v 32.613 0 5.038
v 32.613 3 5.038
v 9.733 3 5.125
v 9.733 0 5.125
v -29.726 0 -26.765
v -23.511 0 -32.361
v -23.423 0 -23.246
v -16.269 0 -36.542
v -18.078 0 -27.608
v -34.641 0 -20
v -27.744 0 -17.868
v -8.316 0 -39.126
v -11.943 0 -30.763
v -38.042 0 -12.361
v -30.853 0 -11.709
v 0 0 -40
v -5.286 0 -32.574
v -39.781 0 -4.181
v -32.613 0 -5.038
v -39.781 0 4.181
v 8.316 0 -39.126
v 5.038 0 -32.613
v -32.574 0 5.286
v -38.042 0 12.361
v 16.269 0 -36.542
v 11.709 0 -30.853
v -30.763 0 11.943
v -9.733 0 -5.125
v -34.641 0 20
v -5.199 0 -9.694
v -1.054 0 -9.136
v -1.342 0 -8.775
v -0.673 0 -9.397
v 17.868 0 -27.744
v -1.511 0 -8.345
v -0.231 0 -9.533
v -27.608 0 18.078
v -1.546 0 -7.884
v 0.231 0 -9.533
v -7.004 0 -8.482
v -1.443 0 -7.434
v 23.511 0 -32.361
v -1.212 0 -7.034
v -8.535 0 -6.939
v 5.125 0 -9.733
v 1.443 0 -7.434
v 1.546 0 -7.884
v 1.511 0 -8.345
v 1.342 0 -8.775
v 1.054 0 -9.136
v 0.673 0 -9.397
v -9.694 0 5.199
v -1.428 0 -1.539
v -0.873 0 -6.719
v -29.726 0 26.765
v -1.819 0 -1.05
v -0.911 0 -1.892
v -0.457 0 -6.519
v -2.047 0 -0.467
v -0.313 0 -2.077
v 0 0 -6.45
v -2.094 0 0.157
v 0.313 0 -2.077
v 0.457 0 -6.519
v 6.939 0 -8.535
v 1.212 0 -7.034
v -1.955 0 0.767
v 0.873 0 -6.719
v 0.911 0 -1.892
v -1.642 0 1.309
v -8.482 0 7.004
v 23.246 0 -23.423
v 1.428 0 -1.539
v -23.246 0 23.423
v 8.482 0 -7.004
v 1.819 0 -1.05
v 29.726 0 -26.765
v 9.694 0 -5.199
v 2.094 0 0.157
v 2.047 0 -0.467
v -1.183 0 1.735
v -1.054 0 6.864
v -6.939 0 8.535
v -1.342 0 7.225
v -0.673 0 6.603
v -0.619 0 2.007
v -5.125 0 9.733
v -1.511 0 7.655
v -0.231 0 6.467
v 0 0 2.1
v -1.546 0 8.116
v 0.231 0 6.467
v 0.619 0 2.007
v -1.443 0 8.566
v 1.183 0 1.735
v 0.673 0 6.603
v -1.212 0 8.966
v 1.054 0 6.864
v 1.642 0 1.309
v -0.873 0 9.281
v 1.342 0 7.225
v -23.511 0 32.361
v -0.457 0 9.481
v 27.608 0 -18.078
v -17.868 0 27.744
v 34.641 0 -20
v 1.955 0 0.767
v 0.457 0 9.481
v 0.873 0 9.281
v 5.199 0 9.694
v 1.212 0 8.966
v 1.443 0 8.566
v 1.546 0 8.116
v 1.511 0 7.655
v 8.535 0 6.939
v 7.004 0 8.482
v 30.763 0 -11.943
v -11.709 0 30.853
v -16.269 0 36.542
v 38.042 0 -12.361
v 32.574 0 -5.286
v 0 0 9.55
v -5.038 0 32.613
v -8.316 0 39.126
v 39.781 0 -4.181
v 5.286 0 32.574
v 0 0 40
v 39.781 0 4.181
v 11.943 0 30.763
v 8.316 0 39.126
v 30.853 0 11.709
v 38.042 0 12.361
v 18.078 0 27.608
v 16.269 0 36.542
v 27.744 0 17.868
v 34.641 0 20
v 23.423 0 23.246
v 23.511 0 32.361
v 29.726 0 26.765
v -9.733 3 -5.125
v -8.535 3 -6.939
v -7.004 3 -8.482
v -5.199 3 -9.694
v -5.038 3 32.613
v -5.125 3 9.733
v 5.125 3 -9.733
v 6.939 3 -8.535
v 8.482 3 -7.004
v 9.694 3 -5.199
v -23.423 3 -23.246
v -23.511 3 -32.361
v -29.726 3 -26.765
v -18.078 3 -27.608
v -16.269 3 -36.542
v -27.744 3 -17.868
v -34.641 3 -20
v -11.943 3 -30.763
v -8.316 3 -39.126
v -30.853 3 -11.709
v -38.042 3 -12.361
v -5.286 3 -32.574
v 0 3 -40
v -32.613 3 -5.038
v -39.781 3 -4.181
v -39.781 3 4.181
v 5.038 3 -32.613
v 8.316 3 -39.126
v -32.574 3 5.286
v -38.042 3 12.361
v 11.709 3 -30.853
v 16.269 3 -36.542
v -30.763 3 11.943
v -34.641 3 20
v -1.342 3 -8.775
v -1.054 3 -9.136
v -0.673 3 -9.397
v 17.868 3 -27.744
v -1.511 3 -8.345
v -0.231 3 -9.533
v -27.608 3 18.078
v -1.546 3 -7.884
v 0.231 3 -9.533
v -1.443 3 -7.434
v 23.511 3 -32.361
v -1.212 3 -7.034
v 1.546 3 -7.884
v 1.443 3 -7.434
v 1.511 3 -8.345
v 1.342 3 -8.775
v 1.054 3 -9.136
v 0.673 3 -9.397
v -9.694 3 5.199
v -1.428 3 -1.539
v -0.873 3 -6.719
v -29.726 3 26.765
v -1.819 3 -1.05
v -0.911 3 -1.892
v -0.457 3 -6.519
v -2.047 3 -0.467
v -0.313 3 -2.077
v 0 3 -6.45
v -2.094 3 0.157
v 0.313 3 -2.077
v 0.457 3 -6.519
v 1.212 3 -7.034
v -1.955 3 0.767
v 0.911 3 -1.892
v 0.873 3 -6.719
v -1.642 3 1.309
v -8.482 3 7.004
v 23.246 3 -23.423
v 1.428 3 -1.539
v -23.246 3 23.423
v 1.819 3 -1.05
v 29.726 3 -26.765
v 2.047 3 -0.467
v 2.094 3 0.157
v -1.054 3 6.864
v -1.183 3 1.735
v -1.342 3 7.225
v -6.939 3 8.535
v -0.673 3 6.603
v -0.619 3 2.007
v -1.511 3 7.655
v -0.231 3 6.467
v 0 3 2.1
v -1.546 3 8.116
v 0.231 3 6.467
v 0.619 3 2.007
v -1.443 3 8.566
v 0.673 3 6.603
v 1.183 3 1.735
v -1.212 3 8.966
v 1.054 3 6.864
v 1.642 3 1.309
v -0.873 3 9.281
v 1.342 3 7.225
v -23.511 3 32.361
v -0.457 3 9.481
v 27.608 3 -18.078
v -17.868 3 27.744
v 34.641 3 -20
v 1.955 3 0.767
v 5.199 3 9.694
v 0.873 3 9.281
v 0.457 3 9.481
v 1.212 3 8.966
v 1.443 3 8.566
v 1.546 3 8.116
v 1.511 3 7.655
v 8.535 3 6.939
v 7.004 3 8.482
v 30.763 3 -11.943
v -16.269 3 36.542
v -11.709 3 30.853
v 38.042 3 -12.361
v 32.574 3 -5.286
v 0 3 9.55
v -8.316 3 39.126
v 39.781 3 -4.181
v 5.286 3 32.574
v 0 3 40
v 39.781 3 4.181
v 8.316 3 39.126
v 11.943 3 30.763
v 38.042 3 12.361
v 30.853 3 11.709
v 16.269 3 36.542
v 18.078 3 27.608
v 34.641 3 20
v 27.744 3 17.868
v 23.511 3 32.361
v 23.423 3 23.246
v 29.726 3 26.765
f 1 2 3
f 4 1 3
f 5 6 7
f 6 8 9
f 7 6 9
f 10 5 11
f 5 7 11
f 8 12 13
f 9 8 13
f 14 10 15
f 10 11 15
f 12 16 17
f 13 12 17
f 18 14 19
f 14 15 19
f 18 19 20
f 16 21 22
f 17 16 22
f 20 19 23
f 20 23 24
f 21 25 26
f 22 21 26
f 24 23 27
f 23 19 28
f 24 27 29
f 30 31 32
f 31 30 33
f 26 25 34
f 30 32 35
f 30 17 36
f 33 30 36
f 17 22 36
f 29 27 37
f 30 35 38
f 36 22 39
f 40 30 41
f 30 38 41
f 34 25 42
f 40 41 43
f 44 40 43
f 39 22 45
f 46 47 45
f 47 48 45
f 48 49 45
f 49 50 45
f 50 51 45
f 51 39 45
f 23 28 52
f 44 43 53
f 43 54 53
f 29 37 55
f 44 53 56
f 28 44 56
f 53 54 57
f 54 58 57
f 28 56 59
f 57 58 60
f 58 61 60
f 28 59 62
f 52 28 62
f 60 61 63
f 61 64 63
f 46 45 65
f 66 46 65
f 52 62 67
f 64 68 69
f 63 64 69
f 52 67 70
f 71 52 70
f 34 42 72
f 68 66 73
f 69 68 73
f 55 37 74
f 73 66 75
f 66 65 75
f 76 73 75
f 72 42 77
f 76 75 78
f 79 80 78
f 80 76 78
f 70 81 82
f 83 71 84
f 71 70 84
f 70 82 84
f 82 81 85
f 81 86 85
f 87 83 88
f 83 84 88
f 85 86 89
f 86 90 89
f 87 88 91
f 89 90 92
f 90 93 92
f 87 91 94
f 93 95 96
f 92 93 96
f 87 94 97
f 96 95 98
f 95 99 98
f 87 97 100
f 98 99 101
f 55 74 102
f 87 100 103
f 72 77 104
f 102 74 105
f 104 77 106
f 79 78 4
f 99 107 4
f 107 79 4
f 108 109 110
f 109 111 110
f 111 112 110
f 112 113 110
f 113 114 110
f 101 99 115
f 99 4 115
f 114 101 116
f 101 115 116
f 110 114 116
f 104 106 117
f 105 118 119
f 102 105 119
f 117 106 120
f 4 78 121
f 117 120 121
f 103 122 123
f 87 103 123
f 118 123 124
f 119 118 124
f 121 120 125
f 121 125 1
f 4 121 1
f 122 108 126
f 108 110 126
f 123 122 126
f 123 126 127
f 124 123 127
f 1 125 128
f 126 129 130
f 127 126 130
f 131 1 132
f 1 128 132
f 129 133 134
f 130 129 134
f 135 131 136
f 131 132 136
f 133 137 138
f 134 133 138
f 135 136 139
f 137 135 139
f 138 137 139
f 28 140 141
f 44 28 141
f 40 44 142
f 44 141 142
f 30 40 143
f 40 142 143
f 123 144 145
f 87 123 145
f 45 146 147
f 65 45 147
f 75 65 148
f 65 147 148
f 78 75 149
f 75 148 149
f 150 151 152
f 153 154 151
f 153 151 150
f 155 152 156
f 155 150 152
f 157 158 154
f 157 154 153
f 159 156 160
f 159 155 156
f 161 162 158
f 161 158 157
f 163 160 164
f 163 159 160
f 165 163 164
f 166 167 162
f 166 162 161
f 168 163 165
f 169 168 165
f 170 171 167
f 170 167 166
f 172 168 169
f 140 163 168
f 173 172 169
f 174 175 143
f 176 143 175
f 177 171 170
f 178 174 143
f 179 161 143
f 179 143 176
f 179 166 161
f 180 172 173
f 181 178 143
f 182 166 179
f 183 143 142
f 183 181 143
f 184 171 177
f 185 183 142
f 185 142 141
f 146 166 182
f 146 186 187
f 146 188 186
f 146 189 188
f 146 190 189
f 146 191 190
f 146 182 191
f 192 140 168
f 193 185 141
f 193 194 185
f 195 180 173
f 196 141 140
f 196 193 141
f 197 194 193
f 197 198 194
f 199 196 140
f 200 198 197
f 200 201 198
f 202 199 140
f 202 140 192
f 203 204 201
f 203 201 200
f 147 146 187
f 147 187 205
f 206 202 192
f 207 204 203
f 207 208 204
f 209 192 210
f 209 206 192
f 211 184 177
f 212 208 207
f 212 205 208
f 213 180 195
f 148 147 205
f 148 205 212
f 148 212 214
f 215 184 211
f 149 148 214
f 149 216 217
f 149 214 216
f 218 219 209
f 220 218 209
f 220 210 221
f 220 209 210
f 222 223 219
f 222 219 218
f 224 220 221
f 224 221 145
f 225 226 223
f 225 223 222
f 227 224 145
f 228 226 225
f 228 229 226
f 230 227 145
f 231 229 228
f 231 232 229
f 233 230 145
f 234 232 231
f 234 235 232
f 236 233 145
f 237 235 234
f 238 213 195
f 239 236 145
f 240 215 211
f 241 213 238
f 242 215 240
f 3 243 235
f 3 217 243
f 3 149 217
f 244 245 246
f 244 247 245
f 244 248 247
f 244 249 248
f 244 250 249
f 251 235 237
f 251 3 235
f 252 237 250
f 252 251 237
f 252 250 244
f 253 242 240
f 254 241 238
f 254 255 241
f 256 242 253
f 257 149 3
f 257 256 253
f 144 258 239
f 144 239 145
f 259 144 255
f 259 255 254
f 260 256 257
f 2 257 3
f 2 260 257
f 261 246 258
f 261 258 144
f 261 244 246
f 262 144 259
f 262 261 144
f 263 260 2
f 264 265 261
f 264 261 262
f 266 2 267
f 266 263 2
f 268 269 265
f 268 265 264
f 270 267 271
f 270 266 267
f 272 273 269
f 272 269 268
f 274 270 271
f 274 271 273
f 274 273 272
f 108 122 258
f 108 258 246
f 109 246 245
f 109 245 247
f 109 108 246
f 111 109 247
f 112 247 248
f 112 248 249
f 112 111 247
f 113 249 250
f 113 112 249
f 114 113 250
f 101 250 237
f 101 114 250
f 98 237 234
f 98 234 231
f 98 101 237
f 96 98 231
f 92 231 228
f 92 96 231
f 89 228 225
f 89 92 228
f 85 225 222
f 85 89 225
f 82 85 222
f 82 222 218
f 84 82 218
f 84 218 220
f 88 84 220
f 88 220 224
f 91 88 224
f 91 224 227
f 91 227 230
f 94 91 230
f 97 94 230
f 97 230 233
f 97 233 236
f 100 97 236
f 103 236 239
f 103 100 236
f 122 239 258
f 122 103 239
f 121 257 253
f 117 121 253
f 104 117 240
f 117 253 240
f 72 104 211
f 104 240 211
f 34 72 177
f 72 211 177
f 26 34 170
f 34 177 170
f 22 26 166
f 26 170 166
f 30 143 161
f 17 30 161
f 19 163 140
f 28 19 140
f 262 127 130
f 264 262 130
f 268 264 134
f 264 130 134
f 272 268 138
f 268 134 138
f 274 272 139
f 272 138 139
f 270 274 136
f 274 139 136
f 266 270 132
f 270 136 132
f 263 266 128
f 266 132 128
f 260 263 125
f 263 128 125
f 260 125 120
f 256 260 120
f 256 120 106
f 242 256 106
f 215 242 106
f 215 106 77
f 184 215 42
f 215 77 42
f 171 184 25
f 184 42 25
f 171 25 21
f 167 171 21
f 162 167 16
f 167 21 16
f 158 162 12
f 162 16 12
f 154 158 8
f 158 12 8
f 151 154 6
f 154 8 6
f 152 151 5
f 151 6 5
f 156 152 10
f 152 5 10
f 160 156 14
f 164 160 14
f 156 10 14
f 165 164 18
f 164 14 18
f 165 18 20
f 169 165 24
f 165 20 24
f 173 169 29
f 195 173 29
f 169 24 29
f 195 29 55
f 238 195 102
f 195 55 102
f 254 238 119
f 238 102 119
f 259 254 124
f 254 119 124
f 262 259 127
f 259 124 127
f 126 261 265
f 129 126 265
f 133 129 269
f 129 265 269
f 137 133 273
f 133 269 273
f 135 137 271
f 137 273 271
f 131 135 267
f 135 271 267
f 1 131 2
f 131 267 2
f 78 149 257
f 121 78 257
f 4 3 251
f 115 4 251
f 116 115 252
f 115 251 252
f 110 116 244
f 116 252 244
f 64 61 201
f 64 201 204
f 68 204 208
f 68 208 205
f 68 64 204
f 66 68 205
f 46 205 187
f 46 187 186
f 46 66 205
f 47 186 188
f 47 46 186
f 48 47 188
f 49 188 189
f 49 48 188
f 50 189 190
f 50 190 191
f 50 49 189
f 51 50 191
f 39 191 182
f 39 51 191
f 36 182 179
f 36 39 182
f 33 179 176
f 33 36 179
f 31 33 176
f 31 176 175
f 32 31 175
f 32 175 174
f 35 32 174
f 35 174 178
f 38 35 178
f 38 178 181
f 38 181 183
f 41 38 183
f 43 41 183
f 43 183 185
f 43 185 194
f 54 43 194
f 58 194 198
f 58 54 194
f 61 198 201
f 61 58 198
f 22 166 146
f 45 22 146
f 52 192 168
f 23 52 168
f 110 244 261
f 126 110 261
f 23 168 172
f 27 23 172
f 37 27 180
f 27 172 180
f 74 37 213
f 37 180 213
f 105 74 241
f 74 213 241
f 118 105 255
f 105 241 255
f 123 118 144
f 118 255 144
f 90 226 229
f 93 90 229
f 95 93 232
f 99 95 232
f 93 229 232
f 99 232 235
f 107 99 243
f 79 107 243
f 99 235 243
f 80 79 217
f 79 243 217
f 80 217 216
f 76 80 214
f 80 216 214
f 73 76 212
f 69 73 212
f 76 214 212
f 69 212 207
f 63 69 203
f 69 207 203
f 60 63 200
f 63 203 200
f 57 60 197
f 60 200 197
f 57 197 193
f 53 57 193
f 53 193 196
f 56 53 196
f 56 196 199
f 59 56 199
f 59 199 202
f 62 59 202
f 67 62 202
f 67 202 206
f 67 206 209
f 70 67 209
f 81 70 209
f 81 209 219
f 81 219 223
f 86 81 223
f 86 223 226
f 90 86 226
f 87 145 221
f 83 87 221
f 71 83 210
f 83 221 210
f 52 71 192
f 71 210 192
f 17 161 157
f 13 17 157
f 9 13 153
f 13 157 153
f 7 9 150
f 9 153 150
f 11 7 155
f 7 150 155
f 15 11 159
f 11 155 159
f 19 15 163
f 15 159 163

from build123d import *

# Parameters (mm, degrees)
SKETCH_1_R          = 40
SKETCH_1_R_2        = 1.55
EXTRUDE_1_DEPTH     = 3
SKETCH_5_R          = 2.1
CUT_EXTRUDE_4_DEPTH = 10
CUT_EXTRUDE_5_DEPTH = 10


with BuildPart() as part:
    # 草图1 → 凸台-拉伸1 (new body)
    with BuildSketch(Plane(origin=(0, 0, 0), x_dir=(1, 0, 0), z_dir=(0, 1, 0))):
        with Locations(Location((0, 0, 0), (0, 0, 270))):
            Circle(SKETCH_1_R)
        with Locations(Location((0, 8, 0), (0, 0, 270))):
            Circle(SKETCH_1_R_2, mode=Mode.SUBTRACT)
        with Locations(Location((0, -8, 0), (0, 0, 270))):
            Circle(SKETCH_1_R_2, mode=Mode.SUBTRACT)
    extrude(amount=EXTRUDE_1_DEPTH)

    # 草图5 → 切除-拉伸4 (cut)
    with BuildSketch(Plane(origin=(0, 3, 0), x_dir=(1, 0, 0), z_dir=(0, 1, 0))):
        with Locations(Location((0, 0, 0), (0, 0, 270))):
            Circle(SKETCH_5_R)
    extrude(amount=-CUT_EXTRUDE_4_DEPTH, mode=Mode.SUBTRACT)

    # 草图4 → 切除-拉伸5 (cut)
    with BuildSketch(Plane(origin=(0, 3, 0), x_dir=(1, 0, 0), z_dir=(0, 1, 0))):
        with BuildLine():
            Line((-5.199210429, 9.693720179), (-5.286154205, 32.573863353))
            ThreePointArc((-5.286154205, 32.573863353), (-23.423025076, 23.245685542), (-32.613096487, 5.038445946))
            Line((-32.613096487, 5.038445946), (-9.732953313, 5.125389722))
            ThreePointArc((-9.732953313, 5.125389722), (-7.807675025, 7.748561847), (-5.199210429, 9.693720179))
        make_face()
        with BuildLine():
            ThreePointArc((32.573863353, 5.286154205), (23.245685542, 23.423025076), (5.038445946, 32.613096487))
            Line((5.038445946, 32.613096487), (5.125389722, 9.732953313))
            ThreePointArc((5.125389722, 9.732953313), (7.748561847, 7.807675025), (9.693720179, 5.199210429))
            Line((9.693720179, 5.199210429), (32.573863353, 5.286154205))
        make_face()
        with BuildLine():
            ThreePointArc((5.286154205, -32.573863353), (23.423025076, -23.245685542), (32.613096487, -5.038445946))
            Line((32.613096487, -5.038445946), (9.732953313, -5.125389722))
            ThreePointArc((9.732953313, -5.125389722), (7.807675025, -7.748561847), (5.199210429, -9.693720179))
            Line((5.199210429, -9.693720179), (5.286154205, -32.573863353))
        make_face()
        with BuildLine():
            Line((-9.693720179, -5.199210429), (-32.573863353, -5.286154205))
            ThreePointArc((-32.573863353, -5.286154205), (-23.245685542, -23.423025076), (-5.038445946, -32.613096487))
            Line((-5.038445946, -32.613096487), (-5.125389722, -9.732953313))
            ThreePointArc((-5.125389722, -9.732953313), (-7.748561847, -7.807675025), (-9.693720179, -5.199210429))
        make_face()
    extrude(amount=-CUT_EXTRUDE_5_DEPTH, mode=Mode.SUBTRACT)


solid = part.part
